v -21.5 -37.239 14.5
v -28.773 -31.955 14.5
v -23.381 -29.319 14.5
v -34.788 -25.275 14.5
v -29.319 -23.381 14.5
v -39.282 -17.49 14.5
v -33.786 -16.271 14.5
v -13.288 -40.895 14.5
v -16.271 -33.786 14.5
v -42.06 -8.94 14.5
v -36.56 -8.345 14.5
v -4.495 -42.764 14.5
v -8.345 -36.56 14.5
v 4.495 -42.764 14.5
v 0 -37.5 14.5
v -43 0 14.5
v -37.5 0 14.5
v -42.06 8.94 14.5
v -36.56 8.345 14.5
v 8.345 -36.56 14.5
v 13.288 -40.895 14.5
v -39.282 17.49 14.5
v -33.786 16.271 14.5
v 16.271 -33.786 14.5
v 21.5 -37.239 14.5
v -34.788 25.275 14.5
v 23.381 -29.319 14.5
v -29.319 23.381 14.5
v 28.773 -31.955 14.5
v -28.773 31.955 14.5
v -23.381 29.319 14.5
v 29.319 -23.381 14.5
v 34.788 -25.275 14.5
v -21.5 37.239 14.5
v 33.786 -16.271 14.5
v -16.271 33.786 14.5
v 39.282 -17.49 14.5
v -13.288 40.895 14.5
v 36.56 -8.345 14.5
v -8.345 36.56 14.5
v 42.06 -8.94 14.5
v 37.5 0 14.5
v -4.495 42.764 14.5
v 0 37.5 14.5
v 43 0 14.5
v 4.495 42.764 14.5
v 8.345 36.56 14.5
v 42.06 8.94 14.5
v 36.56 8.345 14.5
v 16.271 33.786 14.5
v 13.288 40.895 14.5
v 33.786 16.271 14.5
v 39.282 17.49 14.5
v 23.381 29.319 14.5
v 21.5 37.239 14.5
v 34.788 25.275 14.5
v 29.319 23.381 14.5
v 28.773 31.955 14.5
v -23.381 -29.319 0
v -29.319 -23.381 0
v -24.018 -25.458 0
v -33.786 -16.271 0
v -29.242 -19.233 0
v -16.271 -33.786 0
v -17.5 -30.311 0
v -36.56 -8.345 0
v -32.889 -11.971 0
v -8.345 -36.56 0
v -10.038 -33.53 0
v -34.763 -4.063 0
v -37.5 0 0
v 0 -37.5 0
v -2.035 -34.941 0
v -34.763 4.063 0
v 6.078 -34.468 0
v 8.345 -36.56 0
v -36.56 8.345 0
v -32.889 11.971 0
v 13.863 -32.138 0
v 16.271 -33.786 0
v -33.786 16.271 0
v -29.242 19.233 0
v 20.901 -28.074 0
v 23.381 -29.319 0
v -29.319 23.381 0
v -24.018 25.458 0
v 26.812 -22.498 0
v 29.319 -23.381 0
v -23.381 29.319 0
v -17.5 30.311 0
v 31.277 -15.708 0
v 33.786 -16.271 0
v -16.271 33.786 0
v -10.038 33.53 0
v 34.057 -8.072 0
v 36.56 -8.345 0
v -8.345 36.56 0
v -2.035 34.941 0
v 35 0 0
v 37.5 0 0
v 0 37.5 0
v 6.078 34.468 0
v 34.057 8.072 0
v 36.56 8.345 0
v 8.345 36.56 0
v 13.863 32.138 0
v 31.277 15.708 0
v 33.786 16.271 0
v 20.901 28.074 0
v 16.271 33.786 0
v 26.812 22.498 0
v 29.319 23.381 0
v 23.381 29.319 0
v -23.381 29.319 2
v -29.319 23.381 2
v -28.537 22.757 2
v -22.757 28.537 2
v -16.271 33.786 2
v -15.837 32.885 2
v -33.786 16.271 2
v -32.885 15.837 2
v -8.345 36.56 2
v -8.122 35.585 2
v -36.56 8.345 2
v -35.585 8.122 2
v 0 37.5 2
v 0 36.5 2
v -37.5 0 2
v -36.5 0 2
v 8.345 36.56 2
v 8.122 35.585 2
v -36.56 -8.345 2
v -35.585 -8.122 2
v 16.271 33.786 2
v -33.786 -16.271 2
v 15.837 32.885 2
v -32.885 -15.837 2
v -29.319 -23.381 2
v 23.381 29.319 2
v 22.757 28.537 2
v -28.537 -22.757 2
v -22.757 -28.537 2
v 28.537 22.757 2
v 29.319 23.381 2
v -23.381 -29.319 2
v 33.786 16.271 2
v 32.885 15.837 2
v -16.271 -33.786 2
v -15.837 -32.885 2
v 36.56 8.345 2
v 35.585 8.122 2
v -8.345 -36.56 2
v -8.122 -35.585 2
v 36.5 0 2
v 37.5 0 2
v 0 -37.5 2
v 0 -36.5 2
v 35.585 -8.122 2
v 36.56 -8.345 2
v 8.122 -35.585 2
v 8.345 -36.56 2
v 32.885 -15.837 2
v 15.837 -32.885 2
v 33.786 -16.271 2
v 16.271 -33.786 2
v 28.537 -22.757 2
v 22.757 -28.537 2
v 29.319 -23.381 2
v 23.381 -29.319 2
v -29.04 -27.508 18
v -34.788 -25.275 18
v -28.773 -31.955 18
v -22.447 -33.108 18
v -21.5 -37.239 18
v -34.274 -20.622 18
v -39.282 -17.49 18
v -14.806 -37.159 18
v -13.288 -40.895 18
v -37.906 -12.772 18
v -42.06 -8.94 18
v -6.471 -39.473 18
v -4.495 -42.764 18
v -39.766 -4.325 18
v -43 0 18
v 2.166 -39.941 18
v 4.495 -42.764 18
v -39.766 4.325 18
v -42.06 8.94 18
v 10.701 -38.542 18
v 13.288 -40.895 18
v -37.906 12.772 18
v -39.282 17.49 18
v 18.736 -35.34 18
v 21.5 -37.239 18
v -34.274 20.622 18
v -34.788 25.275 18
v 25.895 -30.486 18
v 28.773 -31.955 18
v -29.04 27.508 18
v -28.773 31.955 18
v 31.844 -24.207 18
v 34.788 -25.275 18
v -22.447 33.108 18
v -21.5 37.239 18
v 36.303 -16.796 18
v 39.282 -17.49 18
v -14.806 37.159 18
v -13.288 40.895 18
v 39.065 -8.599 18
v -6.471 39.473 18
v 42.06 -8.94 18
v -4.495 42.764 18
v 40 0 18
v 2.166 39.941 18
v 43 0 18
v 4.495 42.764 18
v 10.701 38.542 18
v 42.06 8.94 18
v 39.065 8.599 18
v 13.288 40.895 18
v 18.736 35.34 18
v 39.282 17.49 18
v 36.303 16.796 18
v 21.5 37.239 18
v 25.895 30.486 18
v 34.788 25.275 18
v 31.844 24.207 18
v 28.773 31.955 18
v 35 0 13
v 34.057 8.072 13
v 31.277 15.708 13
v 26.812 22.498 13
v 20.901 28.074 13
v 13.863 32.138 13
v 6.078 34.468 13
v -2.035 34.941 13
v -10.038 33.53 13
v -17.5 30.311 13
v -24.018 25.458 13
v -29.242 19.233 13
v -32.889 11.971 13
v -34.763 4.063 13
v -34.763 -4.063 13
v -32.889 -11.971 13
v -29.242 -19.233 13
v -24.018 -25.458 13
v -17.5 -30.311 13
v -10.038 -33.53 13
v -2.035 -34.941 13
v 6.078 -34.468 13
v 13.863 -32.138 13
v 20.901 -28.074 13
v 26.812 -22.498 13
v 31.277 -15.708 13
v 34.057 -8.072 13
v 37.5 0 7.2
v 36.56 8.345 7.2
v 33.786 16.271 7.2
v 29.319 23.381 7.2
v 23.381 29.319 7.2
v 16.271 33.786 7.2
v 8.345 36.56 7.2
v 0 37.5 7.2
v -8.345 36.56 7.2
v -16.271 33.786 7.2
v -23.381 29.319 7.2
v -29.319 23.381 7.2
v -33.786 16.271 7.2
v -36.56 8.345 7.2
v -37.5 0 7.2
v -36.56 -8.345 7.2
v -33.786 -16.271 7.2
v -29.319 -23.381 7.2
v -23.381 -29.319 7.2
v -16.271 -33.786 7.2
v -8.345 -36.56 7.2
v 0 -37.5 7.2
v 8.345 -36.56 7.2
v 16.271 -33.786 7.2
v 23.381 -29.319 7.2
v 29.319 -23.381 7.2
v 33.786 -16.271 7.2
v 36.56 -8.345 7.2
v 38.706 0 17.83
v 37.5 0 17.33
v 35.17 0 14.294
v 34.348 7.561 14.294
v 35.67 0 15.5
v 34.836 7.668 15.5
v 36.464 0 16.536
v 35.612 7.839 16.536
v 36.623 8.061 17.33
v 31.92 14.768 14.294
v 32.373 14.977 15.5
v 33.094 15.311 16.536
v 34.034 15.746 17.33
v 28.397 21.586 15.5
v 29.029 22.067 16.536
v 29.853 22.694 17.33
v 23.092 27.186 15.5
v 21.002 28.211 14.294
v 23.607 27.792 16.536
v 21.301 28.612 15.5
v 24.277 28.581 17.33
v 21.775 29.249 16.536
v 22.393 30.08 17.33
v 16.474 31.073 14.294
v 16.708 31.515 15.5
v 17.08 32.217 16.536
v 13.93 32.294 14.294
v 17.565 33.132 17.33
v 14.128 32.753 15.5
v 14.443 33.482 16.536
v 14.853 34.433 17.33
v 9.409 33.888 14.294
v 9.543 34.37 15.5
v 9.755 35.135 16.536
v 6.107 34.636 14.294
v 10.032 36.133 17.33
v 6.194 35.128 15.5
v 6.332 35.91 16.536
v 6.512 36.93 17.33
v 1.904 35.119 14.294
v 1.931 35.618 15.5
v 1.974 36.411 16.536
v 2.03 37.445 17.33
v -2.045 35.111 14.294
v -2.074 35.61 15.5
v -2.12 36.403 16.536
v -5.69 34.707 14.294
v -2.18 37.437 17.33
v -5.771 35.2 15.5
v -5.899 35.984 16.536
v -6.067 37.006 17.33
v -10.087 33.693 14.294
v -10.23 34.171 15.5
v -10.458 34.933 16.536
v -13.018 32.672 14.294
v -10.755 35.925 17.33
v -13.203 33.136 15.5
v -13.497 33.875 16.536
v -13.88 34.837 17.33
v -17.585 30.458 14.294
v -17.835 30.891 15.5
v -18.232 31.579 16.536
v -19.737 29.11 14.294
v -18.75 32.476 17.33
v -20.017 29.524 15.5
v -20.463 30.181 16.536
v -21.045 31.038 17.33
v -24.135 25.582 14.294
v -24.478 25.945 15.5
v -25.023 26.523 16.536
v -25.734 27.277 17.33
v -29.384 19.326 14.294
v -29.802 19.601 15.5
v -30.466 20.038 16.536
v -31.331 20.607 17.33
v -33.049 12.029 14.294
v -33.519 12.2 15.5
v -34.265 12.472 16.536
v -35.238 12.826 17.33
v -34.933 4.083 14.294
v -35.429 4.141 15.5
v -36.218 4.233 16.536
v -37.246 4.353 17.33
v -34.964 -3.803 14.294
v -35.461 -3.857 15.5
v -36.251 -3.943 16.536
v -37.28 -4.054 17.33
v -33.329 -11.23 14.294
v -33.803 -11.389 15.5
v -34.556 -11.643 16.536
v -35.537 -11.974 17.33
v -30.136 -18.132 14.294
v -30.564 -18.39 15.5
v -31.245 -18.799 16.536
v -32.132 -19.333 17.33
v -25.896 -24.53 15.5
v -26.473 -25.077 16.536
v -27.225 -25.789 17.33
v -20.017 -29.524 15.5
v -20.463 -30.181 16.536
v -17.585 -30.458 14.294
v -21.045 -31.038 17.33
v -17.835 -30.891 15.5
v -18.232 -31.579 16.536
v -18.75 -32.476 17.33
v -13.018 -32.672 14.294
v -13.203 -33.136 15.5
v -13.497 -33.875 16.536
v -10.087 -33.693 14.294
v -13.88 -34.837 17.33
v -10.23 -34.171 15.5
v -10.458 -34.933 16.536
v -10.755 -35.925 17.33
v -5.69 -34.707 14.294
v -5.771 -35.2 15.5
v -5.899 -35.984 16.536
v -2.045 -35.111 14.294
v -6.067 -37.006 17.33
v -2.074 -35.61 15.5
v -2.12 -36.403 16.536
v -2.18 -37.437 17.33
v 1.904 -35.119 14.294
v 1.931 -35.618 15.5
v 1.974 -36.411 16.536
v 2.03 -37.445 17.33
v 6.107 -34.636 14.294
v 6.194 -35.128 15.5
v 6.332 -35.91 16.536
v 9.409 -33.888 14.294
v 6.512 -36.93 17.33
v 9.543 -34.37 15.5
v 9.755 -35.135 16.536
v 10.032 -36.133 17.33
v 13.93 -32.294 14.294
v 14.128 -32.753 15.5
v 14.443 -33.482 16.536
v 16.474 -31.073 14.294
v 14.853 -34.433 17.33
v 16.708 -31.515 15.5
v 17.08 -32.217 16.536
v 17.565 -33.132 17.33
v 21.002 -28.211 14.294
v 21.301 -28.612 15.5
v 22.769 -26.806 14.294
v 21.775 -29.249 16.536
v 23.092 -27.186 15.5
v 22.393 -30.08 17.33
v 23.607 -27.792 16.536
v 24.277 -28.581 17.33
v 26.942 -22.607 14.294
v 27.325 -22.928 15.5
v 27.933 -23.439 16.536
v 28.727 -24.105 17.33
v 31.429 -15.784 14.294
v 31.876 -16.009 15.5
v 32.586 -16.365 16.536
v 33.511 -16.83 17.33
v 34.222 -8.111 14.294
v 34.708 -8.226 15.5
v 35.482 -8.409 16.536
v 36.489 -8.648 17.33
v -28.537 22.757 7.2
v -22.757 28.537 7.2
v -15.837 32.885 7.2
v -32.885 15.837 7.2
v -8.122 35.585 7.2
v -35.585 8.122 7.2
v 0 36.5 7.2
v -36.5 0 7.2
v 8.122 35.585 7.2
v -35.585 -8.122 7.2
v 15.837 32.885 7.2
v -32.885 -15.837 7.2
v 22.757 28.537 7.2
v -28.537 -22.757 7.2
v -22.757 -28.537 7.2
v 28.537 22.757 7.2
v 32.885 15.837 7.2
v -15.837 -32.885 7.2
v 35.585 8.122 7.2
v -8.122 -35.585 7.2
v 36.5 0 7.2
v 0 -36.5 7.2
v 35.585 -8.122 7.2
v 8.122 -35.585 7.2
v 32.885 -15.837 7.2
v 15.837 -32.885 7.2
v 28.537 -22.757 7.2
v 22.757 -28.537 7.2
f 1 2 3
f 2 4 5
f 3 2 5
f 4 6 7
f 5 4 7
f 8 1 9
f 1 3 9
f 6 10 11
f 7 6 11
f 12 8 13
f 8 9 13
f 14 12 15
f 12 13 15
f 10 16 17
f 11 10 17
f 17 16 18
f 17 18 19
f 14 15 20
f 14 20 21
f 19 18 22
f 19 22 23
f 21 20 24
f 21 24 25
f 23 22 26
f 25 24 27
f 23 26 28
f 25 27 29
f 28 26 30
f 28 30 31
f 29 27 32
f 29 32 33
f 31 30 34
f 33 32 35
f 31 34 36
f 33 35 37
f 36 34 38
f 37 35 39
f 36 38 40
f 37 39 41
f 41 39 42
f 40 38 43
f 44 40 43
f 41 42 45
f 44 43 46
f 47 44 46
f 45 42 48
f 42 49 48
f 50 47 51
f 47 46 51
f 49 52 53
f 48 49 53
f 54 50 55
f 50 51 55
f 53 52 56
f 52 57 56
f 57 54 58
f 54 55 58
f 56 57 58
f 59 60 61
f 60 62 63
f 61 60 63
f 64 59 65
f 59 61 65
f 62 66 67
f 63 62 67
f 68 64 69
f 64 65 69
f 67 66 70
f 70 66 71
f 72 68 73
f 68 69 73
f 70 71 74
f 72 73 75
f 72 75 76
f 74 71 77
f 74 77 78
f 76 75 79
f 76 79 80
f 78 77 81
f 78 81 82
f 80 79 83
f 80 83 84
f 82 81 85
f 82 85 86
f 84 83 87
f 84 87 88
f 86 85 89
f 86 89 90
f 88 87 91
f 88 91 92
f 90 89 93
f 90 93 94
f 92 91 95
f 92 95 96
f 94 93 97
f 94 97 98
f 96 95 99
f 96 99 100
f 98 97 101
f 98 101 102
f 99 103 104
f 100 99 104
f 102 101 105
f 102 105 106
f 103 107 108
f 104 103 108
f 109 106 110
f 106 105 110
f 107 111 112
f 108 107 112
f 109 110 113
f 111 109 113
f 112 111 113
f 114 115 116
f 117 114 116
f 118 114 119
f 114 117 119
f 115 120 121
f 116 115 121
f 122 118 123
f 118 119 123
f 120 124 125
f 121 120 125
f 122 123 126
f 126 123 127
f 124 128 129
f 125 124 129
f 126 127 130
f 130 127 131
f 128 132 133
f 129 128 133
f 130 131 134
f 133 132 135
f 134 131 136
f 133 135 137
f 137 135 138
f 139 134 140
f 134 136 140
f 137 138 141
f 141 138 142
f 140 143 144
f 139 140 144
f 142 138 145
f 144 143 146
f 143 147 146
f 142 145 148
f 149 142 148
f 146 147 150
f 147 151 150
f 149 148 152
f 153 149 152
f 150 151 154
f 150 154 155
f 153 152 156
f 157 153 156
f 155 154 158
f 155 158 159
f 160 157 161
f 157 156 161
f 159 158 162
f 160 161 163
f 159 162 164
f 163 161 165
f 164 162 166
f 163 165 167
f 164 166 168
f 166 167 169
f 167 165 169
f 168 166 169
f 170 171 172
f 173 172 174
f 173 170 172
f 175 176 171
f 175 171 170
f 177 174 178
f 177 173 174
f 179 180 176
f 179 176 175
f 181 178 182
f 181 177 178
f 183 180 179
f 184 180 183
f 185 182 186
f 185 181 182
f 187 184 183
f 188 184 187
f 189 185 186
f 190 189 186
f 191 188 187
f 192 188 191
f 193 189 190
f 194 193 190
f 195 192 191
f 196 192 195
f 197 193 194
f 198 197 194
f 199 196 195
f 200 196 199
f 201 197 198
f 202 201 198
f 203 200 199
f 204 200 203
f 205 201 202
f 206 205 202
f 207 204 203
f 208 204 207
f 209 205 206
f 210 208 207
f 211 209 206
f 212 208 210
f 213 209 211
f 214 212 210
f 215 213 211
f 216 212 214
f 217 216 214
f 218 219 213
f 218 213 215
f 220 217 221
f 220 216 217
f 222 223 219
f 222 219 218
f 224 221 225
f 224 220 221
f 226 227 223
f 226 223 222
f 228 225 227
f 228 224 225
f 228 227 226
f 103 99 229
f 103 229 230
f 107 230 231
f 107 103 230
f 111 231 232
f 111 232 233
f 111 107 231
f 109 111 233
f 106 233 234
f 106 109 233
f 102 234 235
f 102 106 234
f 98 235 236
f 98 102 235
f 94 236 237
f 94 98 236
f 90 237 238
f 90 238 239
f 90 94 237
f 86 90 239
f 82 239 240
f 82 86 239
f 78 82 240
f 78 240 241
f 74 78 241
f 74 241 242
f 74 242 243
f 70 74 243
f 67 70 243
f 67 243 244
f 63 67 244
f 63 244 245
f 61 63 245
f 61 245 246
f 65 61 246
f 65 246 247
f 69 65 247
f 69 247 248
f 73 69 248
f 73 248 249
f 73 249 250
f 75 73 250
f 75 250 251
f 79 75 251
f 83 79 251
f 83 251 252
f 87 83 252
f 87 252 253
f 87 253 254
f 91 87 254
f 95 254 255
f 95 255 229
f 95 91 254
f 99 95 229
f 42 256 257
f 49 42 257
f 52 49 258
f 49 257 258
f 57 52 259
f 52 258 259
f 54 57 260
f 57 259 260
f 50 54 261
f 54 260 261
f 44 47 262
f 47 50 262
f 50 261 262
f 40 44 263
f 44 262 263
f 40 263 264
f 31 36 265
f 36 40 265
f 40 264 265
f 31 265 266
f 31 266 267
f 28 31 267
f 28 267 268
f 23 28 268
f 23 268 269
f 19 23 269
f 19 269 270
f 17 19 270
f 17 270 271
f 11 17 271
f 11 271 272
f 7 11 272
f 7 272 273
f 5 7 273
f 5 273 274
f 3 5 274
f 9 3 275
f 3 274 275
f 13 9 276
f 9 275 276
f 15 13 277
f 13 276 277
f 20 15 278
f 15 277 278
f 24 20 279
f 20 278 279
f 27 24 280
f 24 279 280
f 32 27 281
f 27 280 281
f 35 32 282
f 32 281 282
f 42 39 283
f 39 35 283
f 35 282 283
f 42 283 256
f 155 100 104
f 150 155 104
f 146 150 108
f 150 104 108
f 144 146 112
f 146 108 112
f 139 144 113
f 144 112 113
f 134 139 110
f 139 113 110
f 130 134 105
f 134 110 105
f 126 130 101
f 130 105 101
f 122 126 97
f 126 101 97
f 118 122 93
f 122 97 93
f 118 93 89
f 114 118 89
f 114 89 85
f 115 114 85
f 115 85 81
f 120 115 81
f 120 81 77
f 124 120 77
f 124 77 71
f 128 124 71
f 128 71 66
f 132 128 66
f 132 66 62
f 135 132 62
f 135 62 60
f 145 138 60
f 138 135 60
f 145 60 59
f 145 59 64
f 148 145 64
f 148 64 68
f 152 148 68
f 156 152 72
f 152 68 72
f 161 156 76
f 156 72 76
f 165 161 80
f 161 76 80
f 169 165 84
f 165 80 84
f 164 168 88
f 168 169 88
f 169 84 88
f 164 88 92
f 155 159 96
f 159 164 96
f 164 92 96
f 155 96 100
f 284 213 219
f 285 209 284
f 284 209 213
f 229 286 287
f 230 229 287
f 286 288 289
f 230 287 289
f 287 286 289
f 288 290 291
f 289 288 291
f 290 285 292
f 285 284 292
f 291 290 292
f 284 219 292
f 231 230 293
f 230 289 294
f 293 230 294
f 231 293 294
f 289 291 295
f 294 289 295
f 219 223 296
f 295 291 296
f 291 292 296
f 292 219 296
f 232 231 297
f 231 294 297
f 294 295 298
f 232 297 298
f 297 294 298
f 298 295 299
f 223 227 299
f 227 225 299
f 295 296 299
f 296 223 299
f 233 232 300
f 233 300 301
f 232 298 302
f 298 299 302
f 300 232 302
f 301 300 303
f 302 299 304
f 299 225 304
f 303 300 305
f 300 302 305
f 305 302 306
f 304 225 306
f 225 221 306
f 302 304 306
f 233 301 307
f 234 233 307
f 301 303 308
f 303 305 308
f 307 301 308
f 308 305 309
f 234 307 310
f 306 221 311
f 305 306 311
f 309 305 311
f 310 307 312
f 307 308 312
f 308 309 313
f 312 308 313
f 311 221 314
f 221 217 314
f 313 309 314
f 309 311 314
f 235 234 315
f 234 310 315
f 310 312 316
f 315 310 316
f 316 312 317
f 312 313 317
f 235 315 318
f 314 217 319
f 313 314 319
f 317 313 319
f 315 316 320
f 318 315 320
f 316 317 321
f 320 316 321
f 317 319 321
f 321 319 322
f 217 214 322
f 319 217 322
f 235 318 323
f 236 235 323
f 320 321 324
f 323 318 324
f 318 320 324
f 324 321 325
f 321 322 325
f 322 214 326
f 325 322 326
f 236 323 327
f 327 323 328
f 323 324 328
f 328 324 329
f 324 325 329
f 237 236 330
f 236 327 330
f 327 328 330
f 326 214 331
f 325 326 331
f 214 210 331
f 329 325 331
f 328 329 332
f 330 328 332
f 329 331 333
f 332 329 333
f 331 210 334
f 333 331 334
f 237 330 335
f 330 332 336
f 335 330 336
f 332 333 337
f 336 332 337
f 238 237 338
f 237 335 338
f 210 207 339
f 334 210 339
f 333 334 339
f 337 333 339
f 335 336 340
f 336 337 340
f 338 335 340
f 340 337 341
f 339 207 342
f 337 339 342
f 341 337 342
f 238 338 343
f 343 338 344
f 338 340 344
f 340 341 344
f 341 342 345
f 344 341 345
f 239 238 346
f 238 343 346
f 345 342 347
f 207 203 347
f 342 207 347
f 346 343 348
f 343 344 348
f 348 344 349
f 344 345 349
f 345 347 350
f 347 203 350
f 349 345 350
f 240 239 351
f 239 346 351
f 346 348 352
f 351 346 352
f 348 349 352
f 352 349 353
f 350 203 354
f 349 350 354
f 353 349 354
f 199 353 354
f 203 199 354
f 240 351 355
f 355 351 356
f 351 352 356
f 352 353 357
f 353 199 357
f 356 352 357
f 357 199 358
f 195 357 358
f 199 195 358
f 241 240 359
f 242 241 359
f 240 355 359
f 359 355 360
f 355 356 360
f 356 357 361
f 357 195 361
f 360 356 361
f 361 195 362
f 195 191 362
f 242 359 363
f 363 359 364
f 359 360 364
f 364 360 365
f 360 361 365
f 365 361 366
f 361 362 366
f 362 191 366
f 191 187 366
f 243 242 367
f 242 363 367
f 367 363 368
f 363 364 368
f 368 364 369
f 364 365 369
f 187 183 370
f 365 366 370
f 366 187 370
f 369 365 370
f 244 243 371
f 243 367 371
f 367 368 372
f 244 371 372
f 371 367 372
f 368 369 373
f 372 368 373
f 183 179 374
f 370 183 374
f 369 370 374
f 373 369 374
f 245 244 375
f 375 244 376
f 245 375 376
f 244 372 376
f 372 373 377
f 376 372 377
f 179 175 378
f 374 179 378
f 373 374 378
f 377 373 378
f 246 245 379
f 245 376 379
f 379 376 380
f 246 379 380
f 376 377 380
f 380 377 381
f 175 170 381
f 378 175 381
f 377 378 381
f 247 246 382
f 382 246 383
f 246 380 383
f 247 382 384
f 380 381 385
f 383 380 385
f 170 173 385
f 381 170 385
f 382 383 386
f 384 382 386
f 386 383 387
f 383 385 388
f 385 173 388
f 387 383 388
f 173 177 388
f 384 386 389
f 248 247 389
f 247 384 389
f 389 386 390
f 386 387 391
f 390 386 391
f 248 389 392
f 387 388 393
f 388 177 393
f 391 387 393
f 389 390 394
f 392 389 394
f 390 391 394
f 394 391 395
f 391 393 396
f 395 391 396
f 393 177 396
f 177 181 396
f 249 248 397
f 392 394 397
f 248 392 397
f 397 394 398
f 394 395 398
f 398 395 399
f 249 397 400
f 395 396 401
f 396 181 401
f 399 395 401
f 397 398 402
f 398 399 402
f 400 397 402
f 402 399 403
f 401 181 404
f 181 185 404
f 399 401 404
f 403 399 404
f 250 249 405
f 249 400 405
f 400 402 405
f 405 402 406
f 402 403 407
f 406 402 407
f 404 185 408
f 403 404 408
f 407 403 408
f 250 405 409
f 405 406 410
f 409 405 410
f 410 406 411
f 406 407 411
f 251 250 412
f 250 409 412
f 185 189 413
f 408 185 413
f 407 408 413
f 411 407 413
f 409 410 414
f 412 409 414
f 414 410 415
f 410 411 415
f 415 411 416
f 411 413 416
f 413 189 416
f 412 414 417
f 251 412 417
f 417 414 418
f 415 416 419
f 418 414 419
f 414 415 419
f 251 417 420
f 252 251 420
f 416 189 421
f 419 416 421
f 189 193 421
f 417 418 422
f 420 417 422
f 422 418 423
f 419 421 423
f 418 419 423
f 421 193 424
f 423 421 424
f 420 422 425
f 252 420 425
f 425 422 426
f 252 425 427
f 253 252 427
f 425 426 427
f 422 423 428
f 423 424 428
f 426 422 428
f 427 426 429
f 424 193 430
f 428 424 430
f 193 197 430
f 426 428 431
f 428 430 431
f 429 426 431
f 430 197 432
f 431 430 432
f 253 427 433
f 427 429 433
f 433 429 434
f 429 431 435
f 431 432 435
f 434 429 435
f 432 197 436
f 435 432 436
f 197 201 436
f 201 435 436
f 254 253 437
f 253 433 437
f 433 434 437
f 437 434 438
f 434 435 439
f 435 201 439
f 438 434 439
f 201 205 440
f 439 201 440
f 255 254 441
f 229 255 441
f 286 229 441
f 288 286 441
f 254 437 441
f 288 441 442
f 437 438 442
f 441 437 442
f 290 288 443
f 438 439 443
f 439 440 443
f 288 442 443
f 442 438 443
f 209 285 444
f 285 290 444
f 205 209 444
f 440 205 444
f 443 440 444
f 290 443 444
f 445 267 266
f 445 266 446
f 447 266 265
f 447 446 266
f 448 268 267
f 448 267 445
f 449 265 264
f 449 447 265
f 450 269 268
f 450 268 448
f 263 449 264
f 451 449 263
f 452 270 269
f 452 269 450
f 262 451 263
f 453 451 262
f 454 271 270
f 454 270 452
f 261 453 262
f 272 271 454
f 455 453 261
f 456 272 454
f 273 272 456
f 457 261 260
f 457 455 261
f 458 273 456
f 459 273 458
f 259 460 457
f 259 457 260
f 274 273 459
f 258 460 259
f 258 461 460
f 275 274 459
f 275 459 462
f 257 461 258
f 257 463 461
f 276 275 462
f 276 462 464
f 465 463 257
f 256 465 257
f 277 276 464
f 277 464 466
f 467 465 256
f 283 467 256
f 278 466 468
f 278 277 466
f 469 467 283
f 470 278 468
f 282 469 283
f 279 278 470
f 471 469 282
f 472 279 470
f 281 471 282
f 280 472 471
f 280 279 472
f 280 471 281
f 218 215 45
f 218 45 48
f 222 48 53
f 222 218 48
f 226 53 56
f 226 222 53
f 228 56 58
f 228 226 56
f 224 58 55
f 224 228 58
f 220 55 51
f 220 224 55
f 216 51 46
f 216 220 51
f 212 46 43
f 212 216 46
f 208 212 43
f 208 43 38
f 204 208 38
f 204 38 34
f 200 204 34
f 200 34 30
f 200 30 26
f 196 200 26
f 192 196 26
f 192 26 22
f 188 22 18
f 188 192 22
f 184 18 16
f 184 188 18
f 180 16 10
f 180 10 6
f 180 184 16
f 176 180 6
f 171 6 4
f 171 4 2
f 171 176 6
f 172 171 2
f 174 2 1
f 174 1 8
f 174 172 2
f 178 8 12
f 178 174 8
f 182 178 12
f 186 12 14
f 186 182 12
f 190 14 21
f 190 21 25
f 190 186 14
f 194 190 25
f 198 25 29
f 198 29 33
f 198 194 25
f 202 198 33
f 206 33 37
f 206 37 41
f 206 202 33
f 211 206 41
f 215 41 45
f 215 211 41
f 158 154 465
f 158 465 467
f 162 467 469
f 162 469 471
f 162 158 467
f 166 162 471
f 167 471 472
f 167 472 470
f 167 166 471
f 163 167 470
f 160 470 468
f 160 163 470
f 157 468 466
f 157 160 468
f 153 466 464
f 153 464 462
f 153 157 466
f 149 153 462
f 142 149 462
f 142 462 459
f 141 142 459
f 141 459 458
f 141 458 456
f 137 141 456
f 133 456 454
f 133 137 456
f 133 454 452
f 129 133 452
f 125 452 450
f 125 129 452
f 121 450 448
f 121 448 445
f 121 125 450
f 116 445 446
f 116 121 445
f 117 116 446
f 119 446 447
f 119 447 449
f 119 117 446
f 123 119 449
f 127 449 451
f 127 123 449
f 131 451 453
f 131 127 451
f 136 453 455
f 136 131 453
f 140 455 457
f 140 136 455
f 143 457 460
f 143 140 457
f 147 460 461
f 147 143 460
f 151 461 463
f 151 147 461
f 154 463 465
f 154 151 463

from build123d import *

# Parameters (mm, degrees)
F0_R     = 37.5
F0_R_2   = 35
F1_DEPTH = 18
F2_R     = 43
F2_R_2   = 35
F3_DEPTH = 3.5
F4_R     = 5
F6_R     = 37.5
F6_R_2   = 36.5
F7_DEPTH = 5.2


with BuildPart() as f1:
    # F0 (on Top) → F1 (new body)
    with BuildSketch(Plane.XY):
        Circle(F0_R)
        Circle(F0_R_2, mode=Mode.SUBTRACT)
    extrude(amount=F1_DEPTH)

    # F2 (on face) → F3 (join)
    with BuildSketch(Plane.XY.offset(18)):
        Circle(F2_R)
        Circle(F2_R_2, mode=Mode.SUBTRACT)
    extrude(amount=-F3_DEPTH)

    # F4
    f4_edges = [f1.edges().sort_by_distance(p)[0] for p in [
        (-35, 0, 18),
    ]]
    fillet(f4_edges, radius=F4_R)

    # F6 (on offset) → F7 (cut)
    with BuildSketch(Plane(origin=(0, 0, 2), x_dir=(1, 0, 0), z_dir=(0, 0, -1))):
        Circle(F6_R)
        Circle(F6_R_2, mode=Mode.SUBTRACT)
    extrude(amount=-F7_DEPTH, mode=Mode.SUBTRACT)


solid = f1.part
